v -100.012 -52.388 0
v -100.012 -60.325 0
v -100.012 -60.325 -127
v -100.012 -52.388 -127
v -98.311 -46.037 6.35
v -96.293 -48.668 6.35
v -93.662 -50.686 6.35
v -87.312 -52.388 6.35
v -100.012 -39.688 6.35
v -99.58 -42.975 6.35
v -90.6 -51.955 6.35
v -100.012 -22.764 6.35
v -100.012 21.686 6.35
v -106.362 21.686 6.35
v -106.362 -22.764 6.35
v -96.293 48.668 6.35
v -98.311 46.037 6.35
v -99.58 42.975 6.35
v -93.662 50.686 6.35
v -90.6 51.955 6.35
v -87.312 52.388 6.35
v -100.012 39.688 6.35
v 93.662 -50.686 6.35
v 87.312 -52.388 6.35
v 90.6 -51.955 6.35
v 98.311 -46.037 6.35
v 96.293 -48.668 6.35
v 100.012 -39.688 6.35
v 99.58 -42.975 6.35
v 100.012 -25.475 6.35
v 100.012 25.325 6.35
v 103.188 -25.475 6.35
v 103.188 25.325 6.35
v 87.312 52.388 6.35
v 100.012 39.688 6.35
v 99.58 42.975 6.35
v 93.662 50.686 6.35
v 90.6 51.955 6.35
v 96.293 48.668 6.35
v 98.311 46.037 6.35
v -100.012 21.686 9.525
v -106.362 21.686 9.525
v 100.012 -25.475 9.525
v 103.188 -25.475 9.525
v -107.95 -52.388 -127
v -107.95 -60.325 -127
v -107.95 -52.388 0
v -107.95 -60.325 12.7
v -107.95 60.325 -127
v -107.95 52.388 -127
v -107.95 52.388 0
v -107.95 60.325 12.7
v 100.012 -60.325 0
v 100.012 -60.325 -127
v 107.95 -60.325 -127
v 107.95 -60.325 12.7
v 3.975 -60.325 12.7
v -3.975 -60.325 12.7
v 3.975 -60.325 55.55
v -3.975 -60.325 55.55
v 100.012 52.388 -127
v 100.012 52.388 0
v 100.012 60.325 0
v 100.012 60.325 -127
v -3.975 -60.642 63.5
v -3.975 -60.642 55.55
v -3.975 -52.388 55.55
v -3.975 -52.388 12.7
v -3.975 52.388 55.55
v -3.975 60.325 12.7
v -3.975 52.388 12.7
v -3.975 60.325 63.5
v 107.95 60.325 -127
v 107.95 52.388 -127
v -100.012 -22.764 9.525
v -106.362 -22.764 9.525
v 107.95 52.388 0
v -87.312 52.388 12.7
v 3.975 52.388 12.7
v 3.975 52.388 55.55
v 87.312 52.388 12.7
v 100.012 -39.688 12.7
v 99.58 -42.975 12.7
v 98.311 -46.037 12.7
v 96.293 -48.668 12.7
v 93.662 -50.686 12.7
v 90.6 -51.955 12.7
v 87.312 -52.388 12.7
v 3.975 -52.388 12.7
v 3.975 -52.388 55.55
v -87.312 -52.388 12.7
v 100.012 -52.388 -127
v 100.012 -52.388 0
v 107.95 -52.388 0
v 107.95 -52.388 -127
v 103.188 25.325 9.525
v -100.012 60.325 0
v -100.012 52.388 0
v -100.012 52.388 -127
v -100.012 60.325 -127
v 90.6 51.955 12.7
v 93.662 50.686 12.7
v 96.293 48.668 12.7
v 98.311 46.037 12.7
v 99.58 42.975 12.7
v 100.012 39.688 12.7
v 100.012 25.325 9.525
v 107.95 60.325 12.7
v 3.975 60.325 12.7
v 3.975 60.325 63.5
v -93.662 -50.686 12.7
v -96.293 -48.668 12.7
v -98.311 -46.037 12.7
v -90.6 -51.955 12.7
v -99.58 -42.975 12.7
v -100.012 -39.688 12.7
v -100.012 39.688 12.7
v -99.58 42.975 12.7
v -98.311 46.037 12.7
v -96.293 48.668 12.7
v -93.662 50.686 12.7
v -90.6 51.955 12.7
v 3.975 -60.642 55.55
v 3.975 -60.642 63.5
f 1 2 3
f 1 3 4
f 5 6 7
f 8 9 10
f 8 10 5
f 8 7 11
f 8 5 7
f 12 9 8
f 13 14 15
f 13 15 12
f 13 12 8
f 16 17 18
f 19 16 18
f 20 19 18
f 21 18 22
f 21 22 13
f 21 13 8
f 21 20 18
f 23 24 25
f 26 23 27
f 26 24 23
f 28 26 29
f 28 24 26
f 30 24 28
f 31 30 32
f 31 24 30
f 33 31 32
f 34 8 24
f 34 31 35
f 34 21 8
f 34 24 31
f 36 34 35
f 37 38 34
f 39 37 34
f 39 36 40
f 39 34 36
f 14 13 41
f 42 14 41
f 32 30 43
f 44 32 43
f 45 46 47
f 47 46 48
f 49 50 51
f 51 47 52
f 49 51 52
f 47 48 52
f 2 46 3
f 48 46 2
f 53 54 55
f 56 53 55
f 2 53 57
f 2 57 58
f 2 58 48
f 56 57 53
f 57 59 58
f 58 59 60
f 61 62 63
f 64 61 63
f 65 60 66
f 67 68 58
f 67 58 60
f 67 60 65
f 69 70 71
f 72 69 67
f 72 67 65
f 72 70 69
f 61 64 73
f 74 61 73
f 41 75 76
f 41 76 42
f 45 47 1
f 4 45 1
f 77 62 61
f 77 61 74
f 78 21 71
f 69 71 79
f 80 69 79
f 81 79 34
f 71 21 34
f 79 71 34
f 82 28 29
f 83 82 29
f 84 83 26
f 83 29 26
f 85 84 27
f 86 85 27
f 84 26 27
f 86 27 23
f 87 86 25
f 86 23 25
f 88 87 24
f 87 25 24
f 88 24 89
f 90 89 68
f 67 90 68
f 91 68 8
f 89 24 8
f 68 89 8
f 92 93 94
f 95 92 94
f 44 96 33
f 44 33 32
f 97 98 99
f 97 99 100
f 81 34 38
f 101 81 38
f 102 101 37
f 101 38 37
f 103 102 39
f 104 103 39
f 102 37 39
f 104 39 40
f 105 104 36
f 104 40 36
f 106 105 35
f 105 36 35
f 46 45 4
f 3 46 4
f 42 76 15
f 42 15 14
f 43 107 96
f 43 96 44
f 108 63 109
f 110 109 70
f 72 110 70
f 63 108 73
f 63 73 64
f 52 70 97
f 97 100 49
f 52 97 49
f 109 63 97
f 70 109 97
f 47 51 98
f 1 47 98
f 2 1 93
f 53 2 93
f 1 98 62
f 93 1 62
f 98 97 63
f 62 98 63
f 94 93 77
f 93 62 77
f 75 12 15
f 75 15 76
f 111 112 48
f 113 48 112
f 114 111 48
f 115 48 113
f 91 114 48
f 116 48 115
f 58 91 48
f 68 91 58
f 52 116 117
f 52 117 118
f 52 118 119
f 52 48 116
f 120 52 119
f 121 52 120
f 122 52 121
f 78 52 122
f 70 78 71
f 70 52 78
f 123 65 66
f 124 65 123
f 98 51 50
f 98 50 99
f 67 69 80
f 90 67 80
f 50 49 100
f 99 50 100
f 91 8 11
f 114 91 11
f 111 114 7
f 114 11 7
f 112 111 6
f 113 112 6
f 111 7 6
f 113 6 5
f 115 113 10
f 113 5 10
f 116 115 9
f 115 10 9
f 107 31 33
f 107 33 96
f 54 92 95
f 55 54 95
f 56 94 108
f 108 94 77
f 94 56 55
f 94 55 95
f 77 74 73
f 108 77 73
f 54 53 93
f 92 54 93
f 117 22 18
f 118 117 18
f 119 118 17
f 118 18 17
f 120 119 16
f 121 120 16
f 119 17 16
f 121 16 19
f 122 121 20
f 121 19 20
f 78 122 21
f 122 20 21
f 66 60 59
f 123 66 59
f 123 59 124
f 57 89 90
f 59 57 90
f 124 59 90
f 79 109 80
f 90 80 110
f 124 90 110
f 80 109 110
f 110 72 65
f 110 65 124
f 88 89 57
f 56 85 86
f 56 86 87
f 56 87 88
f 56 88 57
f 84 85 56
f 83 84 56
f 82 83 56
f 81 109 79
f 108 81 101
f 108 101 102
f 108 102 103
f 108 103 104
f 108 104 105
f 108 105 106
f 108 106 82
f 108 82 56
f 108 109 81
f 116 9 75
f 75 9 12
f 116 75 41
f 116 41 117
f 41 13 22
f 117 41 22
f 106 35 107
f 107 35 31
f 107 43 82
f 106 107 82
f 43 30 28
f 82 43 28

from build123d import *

# Parameters (mm, degrees)
F1_DEPTH  = 6.35
F0_W      = 7.9375
F0_H      = 7.9375
F2_DEPTH  = 12.7
F3_DEPTH  = 127
F5_DEPTH  = 50.8
F6_W      = 7.9502
F6_H      = 7.9502
F7_DEPTH  = 113.03
F8_W      = 44.45
F8_H      = 3.175
F9_DEPTH  = 6.35
F10_W     = 50.8
F10_H     = 3.175
F11_DEPTH = 3.175


with BuildPart() as f1:
    # F0 (on Top) → F1 (new body)
    with BuildSketch(Plane.XY):
        with BuildLine():
            ThreePointArc((-100.0125, -39.6875), (-96.292756, -48.667756), (-87.3125, -52.3875))
            Line((-87.3125, -52.3875), (87.3125, -52.3875))
            ThreePointArc((87.3125, -52.3875), (96.292756, -48.667756), (100.0125, -39.6875))
            Line((100.0125, -39.6875), (100.0125, 39.6875))
            ThreePointArc((100.0125, 39.6875), (96.292756, 48.667756), (87.3125, 52.3875))
            Line((87.3125, 52.3875), (-87.3125, 52.3875))
            ThreePointArc((-87.3125, 52.3875), (-96.292756, 48.667756), (-100.0125, 39.6875))
            Line((-100.0125, 39.6875), (-100.0125, -39.6875))
        make_face()
    extrude(amount=F1_DEPTH)

    # F0 (on Top) → F2 (join)
    with BuildSketch(Plane.XY):
        with BuildLine():
            Line((-100.0125, -39.6875), (-100.0125, -52.3875))
            Line((-100.0125, -52.3875), (-87.3125, -52.3875))
            ThreePointArc((-87.3125, -52.3875), (-96.292756, -48.667756), (-100.0125, -39.6875))
        make_face()
        Polygon((-107.95, 52.3875), (-107.95, -52.3875), (-100.0125, -52.3875), (-100.0125, -39.6875), (-100.0125, 39.6875), (-100.0125, 52.3875), align=None)
        Polygon((-100.0125, -52.3875), (-100.0125, -60.325), (100.0125, -60.325), (100.0125, -52.3875), (87.3125, -52.3875), (-87.3125, -52.3875), align=None)
        Polygon((-100.0125, 60.325), (-100.0125, 52.3875), (-87.3125, 52.3875), (87.3125, 52.3875), (100.0125, 52.3875), (100.0125, 60.325), align=None)
        with BuildLine():
            Line((-87.3125, 52.3875), (-100.0125, 52.3875))
            Line((-100.0125, 52.3875), (-100.0125, 39.6875))
            ThreePointArc((-100.0125, 39.6875), (-96.292756, 48.667756), (-87.3125, 52.3875))
        make_face()
        with BuildLine():
            ThreePointArc((87.3125, 52.3875), (96.292756, 48.667756), (100.0125, 39.6875))
            Line((100.0125, 39.6875), (100.0125, 52.3875))
            Line((100.0125, 52.3875), (87.3125, 52.3875))
        make_face()
        Polygon((100.0125, -39.6875), (100.0125, -52.3875), (107.95, -52.3875), (107.95, 52.3875), (100.0125, 52.3875), (100.0125, 39.6875), align=None)
        with BuildLine():
            Line((87.3125, -52.3875), (100.0125, -52.3875))
            Line((100.0125, -52.3875), (100.0125, -39.6875))
            ThreePointArc((100.0125, -39.6875), (96.292756, -48.667756), (87.3125, -52.3875))
        make_face()
        with Locations((103.98125, -56.35625)):
            Rectangle(F0_W, F0_H)
        with Locations((103.98125, 56.35625)):
            Rectangle(F0_W, F0_H)
        with Locations((-103.98125, 56.35625)):
            Rectangle(F0_W, F0_H)
        with Locations((-103.98125, -56.35625)):
            Rectangle(F0_W, F0_H)
    extrude(amount=F2_DEPTH)

    # F0 (on Top) → F3 (join)
    with BuildSketch(Plane.XY):
        with Locations((-103.98125, -56.35625)):
            Rectangle(F0_W, F0_H)
        with Locations((-103.98125, 56.35625)):
            Rectangle(F0_W, F0_H)
        with Locations((103.98125, 56.35625)):
            Rectangle(F0_W, F0_H)
        with Locations((103.98125, -56.35625)):
            Rectangle(F0_W, F0_H)
    extrude(amount=-F3_DEPTH)

    # F4 (on face) → F5 (join)
    with BuildSketch(Plane.XY.offset(12.7)):
        with BuildLine():
            ThreePointArc((0, 60.325), (-3.96875, 56.35625), (0, 52.3875))
            Line((0, 52.3875), (0, 60.325))
        make_face()
        with BuildLine():
            ThreePointArc((0, -52.3875), (-3.96875, -56.35625), (0, -60.325))
            Line((0, -60.325), (0, -52.3875))
        make_face()
        with BuildLine():
            Line((0, -52.3875), (0, -60.325))
            ThreePointArc((0, -60.325), (2.80633, -59.16258), (3.96875, -56.35625))
            ThreePointArc((3.96875, -56.35625), (2.80633, -53.54992), (0, -52.3875))
        make_face()
        with BuildLine():
            Line((-3.9751, -60.325), (0, -60.325))
            ThreePointArc((0, -60.325), (-3.96875, -56.35625), (0, -52.3875))
            Line((0, -52.3875), (-3.9751, -52.3875))
            Line((-3.9751, -52.3875), (-3.9751, -60.325))
        make_face()
        with BuildLine():
            ThreePointArc((3.96875, -56.35625), (2.80633, -59.16258), (0, -60.325))
            Line((0, -60.325), (3.9751, -60.325))
            Line((3.9751, -60.325), (3.9751, -52.3875))
            Line((3.9751, -52.3875), (0, -52.3875))
            ThreePointArc((0, -52.3875), (2.80633, -53.54992), (3.96875, -56.35625))
        make_face()
        with BuildLine():
            ThreePointArc((3.96875, 56.35625), (2.80633, 53.54992), (0, 52.3875))
            Line((0, 52.3875), (3.9751, 52.3875))
            Line((3.9751, 52.3875), (3.9751, 60.325))
            Line((3.9751, 60.325), (0, 60.325))
            ThreePointArc((0, 60.325), (2.80633, 59.16258), (3.96875, 56.35625))
        make_face()
        with BuildLine():
            Line((0, 60.325), (0, 52.3875))
            ThreePointArc((0, 52.3875), (2.80633, 53.54992), (3.96875, 56.35625))
            ThreePointArc((3.96875, 56.35625), (2.80633, 59.16258), (0, 60.325))
        make_face()
        with BuildLine():
            Line((-3.9751, 52.3875), (0, 52.3875))
            ThreePointArc((0, 52.3875), (-3.96875, 56.35625), (0, 60.325))
            Line((0, 60.325), (-3.9751, 60.325))
            Line((-3.9751, 60.325), (-3.9751, 52.3875))
        make_face()
    extrude(amount=F5_DEPTH)

    # F6 (on face) → F7 (join)
    with BuildSketch(Plane.XZ.offset(-52.3875)):
        with Locations((0, 59.5249)):
            Rectangle(F6_W, F6_H)
    extrude(amount=F7_DEPTH)

    # F8 (on face) → F9 (cut)
    with BuildSketch(Plane.YZ.offset(-100.0125)):
        with Locations((-0.538783, 7.9375)):
            Rectangle(F8_W, F8_H)
    extrude(amount=-F9_DEPTH, mode=Mode.SUBTRACT)

    # F10 (on face) → F11 (cut)
    with BuildSketch(Plane(origin=(100.0125, 0, 0), x_dir=(0, -1, 0), z_dir=(-1, 0, 0))):
        with Locations((0.075357, 7.9375)):
            Rectangle(F10_W, F10_H)
    extrude(amount=-F11_DEPTH, mode=Mode.SUBTRACT)


solid = f1.part
